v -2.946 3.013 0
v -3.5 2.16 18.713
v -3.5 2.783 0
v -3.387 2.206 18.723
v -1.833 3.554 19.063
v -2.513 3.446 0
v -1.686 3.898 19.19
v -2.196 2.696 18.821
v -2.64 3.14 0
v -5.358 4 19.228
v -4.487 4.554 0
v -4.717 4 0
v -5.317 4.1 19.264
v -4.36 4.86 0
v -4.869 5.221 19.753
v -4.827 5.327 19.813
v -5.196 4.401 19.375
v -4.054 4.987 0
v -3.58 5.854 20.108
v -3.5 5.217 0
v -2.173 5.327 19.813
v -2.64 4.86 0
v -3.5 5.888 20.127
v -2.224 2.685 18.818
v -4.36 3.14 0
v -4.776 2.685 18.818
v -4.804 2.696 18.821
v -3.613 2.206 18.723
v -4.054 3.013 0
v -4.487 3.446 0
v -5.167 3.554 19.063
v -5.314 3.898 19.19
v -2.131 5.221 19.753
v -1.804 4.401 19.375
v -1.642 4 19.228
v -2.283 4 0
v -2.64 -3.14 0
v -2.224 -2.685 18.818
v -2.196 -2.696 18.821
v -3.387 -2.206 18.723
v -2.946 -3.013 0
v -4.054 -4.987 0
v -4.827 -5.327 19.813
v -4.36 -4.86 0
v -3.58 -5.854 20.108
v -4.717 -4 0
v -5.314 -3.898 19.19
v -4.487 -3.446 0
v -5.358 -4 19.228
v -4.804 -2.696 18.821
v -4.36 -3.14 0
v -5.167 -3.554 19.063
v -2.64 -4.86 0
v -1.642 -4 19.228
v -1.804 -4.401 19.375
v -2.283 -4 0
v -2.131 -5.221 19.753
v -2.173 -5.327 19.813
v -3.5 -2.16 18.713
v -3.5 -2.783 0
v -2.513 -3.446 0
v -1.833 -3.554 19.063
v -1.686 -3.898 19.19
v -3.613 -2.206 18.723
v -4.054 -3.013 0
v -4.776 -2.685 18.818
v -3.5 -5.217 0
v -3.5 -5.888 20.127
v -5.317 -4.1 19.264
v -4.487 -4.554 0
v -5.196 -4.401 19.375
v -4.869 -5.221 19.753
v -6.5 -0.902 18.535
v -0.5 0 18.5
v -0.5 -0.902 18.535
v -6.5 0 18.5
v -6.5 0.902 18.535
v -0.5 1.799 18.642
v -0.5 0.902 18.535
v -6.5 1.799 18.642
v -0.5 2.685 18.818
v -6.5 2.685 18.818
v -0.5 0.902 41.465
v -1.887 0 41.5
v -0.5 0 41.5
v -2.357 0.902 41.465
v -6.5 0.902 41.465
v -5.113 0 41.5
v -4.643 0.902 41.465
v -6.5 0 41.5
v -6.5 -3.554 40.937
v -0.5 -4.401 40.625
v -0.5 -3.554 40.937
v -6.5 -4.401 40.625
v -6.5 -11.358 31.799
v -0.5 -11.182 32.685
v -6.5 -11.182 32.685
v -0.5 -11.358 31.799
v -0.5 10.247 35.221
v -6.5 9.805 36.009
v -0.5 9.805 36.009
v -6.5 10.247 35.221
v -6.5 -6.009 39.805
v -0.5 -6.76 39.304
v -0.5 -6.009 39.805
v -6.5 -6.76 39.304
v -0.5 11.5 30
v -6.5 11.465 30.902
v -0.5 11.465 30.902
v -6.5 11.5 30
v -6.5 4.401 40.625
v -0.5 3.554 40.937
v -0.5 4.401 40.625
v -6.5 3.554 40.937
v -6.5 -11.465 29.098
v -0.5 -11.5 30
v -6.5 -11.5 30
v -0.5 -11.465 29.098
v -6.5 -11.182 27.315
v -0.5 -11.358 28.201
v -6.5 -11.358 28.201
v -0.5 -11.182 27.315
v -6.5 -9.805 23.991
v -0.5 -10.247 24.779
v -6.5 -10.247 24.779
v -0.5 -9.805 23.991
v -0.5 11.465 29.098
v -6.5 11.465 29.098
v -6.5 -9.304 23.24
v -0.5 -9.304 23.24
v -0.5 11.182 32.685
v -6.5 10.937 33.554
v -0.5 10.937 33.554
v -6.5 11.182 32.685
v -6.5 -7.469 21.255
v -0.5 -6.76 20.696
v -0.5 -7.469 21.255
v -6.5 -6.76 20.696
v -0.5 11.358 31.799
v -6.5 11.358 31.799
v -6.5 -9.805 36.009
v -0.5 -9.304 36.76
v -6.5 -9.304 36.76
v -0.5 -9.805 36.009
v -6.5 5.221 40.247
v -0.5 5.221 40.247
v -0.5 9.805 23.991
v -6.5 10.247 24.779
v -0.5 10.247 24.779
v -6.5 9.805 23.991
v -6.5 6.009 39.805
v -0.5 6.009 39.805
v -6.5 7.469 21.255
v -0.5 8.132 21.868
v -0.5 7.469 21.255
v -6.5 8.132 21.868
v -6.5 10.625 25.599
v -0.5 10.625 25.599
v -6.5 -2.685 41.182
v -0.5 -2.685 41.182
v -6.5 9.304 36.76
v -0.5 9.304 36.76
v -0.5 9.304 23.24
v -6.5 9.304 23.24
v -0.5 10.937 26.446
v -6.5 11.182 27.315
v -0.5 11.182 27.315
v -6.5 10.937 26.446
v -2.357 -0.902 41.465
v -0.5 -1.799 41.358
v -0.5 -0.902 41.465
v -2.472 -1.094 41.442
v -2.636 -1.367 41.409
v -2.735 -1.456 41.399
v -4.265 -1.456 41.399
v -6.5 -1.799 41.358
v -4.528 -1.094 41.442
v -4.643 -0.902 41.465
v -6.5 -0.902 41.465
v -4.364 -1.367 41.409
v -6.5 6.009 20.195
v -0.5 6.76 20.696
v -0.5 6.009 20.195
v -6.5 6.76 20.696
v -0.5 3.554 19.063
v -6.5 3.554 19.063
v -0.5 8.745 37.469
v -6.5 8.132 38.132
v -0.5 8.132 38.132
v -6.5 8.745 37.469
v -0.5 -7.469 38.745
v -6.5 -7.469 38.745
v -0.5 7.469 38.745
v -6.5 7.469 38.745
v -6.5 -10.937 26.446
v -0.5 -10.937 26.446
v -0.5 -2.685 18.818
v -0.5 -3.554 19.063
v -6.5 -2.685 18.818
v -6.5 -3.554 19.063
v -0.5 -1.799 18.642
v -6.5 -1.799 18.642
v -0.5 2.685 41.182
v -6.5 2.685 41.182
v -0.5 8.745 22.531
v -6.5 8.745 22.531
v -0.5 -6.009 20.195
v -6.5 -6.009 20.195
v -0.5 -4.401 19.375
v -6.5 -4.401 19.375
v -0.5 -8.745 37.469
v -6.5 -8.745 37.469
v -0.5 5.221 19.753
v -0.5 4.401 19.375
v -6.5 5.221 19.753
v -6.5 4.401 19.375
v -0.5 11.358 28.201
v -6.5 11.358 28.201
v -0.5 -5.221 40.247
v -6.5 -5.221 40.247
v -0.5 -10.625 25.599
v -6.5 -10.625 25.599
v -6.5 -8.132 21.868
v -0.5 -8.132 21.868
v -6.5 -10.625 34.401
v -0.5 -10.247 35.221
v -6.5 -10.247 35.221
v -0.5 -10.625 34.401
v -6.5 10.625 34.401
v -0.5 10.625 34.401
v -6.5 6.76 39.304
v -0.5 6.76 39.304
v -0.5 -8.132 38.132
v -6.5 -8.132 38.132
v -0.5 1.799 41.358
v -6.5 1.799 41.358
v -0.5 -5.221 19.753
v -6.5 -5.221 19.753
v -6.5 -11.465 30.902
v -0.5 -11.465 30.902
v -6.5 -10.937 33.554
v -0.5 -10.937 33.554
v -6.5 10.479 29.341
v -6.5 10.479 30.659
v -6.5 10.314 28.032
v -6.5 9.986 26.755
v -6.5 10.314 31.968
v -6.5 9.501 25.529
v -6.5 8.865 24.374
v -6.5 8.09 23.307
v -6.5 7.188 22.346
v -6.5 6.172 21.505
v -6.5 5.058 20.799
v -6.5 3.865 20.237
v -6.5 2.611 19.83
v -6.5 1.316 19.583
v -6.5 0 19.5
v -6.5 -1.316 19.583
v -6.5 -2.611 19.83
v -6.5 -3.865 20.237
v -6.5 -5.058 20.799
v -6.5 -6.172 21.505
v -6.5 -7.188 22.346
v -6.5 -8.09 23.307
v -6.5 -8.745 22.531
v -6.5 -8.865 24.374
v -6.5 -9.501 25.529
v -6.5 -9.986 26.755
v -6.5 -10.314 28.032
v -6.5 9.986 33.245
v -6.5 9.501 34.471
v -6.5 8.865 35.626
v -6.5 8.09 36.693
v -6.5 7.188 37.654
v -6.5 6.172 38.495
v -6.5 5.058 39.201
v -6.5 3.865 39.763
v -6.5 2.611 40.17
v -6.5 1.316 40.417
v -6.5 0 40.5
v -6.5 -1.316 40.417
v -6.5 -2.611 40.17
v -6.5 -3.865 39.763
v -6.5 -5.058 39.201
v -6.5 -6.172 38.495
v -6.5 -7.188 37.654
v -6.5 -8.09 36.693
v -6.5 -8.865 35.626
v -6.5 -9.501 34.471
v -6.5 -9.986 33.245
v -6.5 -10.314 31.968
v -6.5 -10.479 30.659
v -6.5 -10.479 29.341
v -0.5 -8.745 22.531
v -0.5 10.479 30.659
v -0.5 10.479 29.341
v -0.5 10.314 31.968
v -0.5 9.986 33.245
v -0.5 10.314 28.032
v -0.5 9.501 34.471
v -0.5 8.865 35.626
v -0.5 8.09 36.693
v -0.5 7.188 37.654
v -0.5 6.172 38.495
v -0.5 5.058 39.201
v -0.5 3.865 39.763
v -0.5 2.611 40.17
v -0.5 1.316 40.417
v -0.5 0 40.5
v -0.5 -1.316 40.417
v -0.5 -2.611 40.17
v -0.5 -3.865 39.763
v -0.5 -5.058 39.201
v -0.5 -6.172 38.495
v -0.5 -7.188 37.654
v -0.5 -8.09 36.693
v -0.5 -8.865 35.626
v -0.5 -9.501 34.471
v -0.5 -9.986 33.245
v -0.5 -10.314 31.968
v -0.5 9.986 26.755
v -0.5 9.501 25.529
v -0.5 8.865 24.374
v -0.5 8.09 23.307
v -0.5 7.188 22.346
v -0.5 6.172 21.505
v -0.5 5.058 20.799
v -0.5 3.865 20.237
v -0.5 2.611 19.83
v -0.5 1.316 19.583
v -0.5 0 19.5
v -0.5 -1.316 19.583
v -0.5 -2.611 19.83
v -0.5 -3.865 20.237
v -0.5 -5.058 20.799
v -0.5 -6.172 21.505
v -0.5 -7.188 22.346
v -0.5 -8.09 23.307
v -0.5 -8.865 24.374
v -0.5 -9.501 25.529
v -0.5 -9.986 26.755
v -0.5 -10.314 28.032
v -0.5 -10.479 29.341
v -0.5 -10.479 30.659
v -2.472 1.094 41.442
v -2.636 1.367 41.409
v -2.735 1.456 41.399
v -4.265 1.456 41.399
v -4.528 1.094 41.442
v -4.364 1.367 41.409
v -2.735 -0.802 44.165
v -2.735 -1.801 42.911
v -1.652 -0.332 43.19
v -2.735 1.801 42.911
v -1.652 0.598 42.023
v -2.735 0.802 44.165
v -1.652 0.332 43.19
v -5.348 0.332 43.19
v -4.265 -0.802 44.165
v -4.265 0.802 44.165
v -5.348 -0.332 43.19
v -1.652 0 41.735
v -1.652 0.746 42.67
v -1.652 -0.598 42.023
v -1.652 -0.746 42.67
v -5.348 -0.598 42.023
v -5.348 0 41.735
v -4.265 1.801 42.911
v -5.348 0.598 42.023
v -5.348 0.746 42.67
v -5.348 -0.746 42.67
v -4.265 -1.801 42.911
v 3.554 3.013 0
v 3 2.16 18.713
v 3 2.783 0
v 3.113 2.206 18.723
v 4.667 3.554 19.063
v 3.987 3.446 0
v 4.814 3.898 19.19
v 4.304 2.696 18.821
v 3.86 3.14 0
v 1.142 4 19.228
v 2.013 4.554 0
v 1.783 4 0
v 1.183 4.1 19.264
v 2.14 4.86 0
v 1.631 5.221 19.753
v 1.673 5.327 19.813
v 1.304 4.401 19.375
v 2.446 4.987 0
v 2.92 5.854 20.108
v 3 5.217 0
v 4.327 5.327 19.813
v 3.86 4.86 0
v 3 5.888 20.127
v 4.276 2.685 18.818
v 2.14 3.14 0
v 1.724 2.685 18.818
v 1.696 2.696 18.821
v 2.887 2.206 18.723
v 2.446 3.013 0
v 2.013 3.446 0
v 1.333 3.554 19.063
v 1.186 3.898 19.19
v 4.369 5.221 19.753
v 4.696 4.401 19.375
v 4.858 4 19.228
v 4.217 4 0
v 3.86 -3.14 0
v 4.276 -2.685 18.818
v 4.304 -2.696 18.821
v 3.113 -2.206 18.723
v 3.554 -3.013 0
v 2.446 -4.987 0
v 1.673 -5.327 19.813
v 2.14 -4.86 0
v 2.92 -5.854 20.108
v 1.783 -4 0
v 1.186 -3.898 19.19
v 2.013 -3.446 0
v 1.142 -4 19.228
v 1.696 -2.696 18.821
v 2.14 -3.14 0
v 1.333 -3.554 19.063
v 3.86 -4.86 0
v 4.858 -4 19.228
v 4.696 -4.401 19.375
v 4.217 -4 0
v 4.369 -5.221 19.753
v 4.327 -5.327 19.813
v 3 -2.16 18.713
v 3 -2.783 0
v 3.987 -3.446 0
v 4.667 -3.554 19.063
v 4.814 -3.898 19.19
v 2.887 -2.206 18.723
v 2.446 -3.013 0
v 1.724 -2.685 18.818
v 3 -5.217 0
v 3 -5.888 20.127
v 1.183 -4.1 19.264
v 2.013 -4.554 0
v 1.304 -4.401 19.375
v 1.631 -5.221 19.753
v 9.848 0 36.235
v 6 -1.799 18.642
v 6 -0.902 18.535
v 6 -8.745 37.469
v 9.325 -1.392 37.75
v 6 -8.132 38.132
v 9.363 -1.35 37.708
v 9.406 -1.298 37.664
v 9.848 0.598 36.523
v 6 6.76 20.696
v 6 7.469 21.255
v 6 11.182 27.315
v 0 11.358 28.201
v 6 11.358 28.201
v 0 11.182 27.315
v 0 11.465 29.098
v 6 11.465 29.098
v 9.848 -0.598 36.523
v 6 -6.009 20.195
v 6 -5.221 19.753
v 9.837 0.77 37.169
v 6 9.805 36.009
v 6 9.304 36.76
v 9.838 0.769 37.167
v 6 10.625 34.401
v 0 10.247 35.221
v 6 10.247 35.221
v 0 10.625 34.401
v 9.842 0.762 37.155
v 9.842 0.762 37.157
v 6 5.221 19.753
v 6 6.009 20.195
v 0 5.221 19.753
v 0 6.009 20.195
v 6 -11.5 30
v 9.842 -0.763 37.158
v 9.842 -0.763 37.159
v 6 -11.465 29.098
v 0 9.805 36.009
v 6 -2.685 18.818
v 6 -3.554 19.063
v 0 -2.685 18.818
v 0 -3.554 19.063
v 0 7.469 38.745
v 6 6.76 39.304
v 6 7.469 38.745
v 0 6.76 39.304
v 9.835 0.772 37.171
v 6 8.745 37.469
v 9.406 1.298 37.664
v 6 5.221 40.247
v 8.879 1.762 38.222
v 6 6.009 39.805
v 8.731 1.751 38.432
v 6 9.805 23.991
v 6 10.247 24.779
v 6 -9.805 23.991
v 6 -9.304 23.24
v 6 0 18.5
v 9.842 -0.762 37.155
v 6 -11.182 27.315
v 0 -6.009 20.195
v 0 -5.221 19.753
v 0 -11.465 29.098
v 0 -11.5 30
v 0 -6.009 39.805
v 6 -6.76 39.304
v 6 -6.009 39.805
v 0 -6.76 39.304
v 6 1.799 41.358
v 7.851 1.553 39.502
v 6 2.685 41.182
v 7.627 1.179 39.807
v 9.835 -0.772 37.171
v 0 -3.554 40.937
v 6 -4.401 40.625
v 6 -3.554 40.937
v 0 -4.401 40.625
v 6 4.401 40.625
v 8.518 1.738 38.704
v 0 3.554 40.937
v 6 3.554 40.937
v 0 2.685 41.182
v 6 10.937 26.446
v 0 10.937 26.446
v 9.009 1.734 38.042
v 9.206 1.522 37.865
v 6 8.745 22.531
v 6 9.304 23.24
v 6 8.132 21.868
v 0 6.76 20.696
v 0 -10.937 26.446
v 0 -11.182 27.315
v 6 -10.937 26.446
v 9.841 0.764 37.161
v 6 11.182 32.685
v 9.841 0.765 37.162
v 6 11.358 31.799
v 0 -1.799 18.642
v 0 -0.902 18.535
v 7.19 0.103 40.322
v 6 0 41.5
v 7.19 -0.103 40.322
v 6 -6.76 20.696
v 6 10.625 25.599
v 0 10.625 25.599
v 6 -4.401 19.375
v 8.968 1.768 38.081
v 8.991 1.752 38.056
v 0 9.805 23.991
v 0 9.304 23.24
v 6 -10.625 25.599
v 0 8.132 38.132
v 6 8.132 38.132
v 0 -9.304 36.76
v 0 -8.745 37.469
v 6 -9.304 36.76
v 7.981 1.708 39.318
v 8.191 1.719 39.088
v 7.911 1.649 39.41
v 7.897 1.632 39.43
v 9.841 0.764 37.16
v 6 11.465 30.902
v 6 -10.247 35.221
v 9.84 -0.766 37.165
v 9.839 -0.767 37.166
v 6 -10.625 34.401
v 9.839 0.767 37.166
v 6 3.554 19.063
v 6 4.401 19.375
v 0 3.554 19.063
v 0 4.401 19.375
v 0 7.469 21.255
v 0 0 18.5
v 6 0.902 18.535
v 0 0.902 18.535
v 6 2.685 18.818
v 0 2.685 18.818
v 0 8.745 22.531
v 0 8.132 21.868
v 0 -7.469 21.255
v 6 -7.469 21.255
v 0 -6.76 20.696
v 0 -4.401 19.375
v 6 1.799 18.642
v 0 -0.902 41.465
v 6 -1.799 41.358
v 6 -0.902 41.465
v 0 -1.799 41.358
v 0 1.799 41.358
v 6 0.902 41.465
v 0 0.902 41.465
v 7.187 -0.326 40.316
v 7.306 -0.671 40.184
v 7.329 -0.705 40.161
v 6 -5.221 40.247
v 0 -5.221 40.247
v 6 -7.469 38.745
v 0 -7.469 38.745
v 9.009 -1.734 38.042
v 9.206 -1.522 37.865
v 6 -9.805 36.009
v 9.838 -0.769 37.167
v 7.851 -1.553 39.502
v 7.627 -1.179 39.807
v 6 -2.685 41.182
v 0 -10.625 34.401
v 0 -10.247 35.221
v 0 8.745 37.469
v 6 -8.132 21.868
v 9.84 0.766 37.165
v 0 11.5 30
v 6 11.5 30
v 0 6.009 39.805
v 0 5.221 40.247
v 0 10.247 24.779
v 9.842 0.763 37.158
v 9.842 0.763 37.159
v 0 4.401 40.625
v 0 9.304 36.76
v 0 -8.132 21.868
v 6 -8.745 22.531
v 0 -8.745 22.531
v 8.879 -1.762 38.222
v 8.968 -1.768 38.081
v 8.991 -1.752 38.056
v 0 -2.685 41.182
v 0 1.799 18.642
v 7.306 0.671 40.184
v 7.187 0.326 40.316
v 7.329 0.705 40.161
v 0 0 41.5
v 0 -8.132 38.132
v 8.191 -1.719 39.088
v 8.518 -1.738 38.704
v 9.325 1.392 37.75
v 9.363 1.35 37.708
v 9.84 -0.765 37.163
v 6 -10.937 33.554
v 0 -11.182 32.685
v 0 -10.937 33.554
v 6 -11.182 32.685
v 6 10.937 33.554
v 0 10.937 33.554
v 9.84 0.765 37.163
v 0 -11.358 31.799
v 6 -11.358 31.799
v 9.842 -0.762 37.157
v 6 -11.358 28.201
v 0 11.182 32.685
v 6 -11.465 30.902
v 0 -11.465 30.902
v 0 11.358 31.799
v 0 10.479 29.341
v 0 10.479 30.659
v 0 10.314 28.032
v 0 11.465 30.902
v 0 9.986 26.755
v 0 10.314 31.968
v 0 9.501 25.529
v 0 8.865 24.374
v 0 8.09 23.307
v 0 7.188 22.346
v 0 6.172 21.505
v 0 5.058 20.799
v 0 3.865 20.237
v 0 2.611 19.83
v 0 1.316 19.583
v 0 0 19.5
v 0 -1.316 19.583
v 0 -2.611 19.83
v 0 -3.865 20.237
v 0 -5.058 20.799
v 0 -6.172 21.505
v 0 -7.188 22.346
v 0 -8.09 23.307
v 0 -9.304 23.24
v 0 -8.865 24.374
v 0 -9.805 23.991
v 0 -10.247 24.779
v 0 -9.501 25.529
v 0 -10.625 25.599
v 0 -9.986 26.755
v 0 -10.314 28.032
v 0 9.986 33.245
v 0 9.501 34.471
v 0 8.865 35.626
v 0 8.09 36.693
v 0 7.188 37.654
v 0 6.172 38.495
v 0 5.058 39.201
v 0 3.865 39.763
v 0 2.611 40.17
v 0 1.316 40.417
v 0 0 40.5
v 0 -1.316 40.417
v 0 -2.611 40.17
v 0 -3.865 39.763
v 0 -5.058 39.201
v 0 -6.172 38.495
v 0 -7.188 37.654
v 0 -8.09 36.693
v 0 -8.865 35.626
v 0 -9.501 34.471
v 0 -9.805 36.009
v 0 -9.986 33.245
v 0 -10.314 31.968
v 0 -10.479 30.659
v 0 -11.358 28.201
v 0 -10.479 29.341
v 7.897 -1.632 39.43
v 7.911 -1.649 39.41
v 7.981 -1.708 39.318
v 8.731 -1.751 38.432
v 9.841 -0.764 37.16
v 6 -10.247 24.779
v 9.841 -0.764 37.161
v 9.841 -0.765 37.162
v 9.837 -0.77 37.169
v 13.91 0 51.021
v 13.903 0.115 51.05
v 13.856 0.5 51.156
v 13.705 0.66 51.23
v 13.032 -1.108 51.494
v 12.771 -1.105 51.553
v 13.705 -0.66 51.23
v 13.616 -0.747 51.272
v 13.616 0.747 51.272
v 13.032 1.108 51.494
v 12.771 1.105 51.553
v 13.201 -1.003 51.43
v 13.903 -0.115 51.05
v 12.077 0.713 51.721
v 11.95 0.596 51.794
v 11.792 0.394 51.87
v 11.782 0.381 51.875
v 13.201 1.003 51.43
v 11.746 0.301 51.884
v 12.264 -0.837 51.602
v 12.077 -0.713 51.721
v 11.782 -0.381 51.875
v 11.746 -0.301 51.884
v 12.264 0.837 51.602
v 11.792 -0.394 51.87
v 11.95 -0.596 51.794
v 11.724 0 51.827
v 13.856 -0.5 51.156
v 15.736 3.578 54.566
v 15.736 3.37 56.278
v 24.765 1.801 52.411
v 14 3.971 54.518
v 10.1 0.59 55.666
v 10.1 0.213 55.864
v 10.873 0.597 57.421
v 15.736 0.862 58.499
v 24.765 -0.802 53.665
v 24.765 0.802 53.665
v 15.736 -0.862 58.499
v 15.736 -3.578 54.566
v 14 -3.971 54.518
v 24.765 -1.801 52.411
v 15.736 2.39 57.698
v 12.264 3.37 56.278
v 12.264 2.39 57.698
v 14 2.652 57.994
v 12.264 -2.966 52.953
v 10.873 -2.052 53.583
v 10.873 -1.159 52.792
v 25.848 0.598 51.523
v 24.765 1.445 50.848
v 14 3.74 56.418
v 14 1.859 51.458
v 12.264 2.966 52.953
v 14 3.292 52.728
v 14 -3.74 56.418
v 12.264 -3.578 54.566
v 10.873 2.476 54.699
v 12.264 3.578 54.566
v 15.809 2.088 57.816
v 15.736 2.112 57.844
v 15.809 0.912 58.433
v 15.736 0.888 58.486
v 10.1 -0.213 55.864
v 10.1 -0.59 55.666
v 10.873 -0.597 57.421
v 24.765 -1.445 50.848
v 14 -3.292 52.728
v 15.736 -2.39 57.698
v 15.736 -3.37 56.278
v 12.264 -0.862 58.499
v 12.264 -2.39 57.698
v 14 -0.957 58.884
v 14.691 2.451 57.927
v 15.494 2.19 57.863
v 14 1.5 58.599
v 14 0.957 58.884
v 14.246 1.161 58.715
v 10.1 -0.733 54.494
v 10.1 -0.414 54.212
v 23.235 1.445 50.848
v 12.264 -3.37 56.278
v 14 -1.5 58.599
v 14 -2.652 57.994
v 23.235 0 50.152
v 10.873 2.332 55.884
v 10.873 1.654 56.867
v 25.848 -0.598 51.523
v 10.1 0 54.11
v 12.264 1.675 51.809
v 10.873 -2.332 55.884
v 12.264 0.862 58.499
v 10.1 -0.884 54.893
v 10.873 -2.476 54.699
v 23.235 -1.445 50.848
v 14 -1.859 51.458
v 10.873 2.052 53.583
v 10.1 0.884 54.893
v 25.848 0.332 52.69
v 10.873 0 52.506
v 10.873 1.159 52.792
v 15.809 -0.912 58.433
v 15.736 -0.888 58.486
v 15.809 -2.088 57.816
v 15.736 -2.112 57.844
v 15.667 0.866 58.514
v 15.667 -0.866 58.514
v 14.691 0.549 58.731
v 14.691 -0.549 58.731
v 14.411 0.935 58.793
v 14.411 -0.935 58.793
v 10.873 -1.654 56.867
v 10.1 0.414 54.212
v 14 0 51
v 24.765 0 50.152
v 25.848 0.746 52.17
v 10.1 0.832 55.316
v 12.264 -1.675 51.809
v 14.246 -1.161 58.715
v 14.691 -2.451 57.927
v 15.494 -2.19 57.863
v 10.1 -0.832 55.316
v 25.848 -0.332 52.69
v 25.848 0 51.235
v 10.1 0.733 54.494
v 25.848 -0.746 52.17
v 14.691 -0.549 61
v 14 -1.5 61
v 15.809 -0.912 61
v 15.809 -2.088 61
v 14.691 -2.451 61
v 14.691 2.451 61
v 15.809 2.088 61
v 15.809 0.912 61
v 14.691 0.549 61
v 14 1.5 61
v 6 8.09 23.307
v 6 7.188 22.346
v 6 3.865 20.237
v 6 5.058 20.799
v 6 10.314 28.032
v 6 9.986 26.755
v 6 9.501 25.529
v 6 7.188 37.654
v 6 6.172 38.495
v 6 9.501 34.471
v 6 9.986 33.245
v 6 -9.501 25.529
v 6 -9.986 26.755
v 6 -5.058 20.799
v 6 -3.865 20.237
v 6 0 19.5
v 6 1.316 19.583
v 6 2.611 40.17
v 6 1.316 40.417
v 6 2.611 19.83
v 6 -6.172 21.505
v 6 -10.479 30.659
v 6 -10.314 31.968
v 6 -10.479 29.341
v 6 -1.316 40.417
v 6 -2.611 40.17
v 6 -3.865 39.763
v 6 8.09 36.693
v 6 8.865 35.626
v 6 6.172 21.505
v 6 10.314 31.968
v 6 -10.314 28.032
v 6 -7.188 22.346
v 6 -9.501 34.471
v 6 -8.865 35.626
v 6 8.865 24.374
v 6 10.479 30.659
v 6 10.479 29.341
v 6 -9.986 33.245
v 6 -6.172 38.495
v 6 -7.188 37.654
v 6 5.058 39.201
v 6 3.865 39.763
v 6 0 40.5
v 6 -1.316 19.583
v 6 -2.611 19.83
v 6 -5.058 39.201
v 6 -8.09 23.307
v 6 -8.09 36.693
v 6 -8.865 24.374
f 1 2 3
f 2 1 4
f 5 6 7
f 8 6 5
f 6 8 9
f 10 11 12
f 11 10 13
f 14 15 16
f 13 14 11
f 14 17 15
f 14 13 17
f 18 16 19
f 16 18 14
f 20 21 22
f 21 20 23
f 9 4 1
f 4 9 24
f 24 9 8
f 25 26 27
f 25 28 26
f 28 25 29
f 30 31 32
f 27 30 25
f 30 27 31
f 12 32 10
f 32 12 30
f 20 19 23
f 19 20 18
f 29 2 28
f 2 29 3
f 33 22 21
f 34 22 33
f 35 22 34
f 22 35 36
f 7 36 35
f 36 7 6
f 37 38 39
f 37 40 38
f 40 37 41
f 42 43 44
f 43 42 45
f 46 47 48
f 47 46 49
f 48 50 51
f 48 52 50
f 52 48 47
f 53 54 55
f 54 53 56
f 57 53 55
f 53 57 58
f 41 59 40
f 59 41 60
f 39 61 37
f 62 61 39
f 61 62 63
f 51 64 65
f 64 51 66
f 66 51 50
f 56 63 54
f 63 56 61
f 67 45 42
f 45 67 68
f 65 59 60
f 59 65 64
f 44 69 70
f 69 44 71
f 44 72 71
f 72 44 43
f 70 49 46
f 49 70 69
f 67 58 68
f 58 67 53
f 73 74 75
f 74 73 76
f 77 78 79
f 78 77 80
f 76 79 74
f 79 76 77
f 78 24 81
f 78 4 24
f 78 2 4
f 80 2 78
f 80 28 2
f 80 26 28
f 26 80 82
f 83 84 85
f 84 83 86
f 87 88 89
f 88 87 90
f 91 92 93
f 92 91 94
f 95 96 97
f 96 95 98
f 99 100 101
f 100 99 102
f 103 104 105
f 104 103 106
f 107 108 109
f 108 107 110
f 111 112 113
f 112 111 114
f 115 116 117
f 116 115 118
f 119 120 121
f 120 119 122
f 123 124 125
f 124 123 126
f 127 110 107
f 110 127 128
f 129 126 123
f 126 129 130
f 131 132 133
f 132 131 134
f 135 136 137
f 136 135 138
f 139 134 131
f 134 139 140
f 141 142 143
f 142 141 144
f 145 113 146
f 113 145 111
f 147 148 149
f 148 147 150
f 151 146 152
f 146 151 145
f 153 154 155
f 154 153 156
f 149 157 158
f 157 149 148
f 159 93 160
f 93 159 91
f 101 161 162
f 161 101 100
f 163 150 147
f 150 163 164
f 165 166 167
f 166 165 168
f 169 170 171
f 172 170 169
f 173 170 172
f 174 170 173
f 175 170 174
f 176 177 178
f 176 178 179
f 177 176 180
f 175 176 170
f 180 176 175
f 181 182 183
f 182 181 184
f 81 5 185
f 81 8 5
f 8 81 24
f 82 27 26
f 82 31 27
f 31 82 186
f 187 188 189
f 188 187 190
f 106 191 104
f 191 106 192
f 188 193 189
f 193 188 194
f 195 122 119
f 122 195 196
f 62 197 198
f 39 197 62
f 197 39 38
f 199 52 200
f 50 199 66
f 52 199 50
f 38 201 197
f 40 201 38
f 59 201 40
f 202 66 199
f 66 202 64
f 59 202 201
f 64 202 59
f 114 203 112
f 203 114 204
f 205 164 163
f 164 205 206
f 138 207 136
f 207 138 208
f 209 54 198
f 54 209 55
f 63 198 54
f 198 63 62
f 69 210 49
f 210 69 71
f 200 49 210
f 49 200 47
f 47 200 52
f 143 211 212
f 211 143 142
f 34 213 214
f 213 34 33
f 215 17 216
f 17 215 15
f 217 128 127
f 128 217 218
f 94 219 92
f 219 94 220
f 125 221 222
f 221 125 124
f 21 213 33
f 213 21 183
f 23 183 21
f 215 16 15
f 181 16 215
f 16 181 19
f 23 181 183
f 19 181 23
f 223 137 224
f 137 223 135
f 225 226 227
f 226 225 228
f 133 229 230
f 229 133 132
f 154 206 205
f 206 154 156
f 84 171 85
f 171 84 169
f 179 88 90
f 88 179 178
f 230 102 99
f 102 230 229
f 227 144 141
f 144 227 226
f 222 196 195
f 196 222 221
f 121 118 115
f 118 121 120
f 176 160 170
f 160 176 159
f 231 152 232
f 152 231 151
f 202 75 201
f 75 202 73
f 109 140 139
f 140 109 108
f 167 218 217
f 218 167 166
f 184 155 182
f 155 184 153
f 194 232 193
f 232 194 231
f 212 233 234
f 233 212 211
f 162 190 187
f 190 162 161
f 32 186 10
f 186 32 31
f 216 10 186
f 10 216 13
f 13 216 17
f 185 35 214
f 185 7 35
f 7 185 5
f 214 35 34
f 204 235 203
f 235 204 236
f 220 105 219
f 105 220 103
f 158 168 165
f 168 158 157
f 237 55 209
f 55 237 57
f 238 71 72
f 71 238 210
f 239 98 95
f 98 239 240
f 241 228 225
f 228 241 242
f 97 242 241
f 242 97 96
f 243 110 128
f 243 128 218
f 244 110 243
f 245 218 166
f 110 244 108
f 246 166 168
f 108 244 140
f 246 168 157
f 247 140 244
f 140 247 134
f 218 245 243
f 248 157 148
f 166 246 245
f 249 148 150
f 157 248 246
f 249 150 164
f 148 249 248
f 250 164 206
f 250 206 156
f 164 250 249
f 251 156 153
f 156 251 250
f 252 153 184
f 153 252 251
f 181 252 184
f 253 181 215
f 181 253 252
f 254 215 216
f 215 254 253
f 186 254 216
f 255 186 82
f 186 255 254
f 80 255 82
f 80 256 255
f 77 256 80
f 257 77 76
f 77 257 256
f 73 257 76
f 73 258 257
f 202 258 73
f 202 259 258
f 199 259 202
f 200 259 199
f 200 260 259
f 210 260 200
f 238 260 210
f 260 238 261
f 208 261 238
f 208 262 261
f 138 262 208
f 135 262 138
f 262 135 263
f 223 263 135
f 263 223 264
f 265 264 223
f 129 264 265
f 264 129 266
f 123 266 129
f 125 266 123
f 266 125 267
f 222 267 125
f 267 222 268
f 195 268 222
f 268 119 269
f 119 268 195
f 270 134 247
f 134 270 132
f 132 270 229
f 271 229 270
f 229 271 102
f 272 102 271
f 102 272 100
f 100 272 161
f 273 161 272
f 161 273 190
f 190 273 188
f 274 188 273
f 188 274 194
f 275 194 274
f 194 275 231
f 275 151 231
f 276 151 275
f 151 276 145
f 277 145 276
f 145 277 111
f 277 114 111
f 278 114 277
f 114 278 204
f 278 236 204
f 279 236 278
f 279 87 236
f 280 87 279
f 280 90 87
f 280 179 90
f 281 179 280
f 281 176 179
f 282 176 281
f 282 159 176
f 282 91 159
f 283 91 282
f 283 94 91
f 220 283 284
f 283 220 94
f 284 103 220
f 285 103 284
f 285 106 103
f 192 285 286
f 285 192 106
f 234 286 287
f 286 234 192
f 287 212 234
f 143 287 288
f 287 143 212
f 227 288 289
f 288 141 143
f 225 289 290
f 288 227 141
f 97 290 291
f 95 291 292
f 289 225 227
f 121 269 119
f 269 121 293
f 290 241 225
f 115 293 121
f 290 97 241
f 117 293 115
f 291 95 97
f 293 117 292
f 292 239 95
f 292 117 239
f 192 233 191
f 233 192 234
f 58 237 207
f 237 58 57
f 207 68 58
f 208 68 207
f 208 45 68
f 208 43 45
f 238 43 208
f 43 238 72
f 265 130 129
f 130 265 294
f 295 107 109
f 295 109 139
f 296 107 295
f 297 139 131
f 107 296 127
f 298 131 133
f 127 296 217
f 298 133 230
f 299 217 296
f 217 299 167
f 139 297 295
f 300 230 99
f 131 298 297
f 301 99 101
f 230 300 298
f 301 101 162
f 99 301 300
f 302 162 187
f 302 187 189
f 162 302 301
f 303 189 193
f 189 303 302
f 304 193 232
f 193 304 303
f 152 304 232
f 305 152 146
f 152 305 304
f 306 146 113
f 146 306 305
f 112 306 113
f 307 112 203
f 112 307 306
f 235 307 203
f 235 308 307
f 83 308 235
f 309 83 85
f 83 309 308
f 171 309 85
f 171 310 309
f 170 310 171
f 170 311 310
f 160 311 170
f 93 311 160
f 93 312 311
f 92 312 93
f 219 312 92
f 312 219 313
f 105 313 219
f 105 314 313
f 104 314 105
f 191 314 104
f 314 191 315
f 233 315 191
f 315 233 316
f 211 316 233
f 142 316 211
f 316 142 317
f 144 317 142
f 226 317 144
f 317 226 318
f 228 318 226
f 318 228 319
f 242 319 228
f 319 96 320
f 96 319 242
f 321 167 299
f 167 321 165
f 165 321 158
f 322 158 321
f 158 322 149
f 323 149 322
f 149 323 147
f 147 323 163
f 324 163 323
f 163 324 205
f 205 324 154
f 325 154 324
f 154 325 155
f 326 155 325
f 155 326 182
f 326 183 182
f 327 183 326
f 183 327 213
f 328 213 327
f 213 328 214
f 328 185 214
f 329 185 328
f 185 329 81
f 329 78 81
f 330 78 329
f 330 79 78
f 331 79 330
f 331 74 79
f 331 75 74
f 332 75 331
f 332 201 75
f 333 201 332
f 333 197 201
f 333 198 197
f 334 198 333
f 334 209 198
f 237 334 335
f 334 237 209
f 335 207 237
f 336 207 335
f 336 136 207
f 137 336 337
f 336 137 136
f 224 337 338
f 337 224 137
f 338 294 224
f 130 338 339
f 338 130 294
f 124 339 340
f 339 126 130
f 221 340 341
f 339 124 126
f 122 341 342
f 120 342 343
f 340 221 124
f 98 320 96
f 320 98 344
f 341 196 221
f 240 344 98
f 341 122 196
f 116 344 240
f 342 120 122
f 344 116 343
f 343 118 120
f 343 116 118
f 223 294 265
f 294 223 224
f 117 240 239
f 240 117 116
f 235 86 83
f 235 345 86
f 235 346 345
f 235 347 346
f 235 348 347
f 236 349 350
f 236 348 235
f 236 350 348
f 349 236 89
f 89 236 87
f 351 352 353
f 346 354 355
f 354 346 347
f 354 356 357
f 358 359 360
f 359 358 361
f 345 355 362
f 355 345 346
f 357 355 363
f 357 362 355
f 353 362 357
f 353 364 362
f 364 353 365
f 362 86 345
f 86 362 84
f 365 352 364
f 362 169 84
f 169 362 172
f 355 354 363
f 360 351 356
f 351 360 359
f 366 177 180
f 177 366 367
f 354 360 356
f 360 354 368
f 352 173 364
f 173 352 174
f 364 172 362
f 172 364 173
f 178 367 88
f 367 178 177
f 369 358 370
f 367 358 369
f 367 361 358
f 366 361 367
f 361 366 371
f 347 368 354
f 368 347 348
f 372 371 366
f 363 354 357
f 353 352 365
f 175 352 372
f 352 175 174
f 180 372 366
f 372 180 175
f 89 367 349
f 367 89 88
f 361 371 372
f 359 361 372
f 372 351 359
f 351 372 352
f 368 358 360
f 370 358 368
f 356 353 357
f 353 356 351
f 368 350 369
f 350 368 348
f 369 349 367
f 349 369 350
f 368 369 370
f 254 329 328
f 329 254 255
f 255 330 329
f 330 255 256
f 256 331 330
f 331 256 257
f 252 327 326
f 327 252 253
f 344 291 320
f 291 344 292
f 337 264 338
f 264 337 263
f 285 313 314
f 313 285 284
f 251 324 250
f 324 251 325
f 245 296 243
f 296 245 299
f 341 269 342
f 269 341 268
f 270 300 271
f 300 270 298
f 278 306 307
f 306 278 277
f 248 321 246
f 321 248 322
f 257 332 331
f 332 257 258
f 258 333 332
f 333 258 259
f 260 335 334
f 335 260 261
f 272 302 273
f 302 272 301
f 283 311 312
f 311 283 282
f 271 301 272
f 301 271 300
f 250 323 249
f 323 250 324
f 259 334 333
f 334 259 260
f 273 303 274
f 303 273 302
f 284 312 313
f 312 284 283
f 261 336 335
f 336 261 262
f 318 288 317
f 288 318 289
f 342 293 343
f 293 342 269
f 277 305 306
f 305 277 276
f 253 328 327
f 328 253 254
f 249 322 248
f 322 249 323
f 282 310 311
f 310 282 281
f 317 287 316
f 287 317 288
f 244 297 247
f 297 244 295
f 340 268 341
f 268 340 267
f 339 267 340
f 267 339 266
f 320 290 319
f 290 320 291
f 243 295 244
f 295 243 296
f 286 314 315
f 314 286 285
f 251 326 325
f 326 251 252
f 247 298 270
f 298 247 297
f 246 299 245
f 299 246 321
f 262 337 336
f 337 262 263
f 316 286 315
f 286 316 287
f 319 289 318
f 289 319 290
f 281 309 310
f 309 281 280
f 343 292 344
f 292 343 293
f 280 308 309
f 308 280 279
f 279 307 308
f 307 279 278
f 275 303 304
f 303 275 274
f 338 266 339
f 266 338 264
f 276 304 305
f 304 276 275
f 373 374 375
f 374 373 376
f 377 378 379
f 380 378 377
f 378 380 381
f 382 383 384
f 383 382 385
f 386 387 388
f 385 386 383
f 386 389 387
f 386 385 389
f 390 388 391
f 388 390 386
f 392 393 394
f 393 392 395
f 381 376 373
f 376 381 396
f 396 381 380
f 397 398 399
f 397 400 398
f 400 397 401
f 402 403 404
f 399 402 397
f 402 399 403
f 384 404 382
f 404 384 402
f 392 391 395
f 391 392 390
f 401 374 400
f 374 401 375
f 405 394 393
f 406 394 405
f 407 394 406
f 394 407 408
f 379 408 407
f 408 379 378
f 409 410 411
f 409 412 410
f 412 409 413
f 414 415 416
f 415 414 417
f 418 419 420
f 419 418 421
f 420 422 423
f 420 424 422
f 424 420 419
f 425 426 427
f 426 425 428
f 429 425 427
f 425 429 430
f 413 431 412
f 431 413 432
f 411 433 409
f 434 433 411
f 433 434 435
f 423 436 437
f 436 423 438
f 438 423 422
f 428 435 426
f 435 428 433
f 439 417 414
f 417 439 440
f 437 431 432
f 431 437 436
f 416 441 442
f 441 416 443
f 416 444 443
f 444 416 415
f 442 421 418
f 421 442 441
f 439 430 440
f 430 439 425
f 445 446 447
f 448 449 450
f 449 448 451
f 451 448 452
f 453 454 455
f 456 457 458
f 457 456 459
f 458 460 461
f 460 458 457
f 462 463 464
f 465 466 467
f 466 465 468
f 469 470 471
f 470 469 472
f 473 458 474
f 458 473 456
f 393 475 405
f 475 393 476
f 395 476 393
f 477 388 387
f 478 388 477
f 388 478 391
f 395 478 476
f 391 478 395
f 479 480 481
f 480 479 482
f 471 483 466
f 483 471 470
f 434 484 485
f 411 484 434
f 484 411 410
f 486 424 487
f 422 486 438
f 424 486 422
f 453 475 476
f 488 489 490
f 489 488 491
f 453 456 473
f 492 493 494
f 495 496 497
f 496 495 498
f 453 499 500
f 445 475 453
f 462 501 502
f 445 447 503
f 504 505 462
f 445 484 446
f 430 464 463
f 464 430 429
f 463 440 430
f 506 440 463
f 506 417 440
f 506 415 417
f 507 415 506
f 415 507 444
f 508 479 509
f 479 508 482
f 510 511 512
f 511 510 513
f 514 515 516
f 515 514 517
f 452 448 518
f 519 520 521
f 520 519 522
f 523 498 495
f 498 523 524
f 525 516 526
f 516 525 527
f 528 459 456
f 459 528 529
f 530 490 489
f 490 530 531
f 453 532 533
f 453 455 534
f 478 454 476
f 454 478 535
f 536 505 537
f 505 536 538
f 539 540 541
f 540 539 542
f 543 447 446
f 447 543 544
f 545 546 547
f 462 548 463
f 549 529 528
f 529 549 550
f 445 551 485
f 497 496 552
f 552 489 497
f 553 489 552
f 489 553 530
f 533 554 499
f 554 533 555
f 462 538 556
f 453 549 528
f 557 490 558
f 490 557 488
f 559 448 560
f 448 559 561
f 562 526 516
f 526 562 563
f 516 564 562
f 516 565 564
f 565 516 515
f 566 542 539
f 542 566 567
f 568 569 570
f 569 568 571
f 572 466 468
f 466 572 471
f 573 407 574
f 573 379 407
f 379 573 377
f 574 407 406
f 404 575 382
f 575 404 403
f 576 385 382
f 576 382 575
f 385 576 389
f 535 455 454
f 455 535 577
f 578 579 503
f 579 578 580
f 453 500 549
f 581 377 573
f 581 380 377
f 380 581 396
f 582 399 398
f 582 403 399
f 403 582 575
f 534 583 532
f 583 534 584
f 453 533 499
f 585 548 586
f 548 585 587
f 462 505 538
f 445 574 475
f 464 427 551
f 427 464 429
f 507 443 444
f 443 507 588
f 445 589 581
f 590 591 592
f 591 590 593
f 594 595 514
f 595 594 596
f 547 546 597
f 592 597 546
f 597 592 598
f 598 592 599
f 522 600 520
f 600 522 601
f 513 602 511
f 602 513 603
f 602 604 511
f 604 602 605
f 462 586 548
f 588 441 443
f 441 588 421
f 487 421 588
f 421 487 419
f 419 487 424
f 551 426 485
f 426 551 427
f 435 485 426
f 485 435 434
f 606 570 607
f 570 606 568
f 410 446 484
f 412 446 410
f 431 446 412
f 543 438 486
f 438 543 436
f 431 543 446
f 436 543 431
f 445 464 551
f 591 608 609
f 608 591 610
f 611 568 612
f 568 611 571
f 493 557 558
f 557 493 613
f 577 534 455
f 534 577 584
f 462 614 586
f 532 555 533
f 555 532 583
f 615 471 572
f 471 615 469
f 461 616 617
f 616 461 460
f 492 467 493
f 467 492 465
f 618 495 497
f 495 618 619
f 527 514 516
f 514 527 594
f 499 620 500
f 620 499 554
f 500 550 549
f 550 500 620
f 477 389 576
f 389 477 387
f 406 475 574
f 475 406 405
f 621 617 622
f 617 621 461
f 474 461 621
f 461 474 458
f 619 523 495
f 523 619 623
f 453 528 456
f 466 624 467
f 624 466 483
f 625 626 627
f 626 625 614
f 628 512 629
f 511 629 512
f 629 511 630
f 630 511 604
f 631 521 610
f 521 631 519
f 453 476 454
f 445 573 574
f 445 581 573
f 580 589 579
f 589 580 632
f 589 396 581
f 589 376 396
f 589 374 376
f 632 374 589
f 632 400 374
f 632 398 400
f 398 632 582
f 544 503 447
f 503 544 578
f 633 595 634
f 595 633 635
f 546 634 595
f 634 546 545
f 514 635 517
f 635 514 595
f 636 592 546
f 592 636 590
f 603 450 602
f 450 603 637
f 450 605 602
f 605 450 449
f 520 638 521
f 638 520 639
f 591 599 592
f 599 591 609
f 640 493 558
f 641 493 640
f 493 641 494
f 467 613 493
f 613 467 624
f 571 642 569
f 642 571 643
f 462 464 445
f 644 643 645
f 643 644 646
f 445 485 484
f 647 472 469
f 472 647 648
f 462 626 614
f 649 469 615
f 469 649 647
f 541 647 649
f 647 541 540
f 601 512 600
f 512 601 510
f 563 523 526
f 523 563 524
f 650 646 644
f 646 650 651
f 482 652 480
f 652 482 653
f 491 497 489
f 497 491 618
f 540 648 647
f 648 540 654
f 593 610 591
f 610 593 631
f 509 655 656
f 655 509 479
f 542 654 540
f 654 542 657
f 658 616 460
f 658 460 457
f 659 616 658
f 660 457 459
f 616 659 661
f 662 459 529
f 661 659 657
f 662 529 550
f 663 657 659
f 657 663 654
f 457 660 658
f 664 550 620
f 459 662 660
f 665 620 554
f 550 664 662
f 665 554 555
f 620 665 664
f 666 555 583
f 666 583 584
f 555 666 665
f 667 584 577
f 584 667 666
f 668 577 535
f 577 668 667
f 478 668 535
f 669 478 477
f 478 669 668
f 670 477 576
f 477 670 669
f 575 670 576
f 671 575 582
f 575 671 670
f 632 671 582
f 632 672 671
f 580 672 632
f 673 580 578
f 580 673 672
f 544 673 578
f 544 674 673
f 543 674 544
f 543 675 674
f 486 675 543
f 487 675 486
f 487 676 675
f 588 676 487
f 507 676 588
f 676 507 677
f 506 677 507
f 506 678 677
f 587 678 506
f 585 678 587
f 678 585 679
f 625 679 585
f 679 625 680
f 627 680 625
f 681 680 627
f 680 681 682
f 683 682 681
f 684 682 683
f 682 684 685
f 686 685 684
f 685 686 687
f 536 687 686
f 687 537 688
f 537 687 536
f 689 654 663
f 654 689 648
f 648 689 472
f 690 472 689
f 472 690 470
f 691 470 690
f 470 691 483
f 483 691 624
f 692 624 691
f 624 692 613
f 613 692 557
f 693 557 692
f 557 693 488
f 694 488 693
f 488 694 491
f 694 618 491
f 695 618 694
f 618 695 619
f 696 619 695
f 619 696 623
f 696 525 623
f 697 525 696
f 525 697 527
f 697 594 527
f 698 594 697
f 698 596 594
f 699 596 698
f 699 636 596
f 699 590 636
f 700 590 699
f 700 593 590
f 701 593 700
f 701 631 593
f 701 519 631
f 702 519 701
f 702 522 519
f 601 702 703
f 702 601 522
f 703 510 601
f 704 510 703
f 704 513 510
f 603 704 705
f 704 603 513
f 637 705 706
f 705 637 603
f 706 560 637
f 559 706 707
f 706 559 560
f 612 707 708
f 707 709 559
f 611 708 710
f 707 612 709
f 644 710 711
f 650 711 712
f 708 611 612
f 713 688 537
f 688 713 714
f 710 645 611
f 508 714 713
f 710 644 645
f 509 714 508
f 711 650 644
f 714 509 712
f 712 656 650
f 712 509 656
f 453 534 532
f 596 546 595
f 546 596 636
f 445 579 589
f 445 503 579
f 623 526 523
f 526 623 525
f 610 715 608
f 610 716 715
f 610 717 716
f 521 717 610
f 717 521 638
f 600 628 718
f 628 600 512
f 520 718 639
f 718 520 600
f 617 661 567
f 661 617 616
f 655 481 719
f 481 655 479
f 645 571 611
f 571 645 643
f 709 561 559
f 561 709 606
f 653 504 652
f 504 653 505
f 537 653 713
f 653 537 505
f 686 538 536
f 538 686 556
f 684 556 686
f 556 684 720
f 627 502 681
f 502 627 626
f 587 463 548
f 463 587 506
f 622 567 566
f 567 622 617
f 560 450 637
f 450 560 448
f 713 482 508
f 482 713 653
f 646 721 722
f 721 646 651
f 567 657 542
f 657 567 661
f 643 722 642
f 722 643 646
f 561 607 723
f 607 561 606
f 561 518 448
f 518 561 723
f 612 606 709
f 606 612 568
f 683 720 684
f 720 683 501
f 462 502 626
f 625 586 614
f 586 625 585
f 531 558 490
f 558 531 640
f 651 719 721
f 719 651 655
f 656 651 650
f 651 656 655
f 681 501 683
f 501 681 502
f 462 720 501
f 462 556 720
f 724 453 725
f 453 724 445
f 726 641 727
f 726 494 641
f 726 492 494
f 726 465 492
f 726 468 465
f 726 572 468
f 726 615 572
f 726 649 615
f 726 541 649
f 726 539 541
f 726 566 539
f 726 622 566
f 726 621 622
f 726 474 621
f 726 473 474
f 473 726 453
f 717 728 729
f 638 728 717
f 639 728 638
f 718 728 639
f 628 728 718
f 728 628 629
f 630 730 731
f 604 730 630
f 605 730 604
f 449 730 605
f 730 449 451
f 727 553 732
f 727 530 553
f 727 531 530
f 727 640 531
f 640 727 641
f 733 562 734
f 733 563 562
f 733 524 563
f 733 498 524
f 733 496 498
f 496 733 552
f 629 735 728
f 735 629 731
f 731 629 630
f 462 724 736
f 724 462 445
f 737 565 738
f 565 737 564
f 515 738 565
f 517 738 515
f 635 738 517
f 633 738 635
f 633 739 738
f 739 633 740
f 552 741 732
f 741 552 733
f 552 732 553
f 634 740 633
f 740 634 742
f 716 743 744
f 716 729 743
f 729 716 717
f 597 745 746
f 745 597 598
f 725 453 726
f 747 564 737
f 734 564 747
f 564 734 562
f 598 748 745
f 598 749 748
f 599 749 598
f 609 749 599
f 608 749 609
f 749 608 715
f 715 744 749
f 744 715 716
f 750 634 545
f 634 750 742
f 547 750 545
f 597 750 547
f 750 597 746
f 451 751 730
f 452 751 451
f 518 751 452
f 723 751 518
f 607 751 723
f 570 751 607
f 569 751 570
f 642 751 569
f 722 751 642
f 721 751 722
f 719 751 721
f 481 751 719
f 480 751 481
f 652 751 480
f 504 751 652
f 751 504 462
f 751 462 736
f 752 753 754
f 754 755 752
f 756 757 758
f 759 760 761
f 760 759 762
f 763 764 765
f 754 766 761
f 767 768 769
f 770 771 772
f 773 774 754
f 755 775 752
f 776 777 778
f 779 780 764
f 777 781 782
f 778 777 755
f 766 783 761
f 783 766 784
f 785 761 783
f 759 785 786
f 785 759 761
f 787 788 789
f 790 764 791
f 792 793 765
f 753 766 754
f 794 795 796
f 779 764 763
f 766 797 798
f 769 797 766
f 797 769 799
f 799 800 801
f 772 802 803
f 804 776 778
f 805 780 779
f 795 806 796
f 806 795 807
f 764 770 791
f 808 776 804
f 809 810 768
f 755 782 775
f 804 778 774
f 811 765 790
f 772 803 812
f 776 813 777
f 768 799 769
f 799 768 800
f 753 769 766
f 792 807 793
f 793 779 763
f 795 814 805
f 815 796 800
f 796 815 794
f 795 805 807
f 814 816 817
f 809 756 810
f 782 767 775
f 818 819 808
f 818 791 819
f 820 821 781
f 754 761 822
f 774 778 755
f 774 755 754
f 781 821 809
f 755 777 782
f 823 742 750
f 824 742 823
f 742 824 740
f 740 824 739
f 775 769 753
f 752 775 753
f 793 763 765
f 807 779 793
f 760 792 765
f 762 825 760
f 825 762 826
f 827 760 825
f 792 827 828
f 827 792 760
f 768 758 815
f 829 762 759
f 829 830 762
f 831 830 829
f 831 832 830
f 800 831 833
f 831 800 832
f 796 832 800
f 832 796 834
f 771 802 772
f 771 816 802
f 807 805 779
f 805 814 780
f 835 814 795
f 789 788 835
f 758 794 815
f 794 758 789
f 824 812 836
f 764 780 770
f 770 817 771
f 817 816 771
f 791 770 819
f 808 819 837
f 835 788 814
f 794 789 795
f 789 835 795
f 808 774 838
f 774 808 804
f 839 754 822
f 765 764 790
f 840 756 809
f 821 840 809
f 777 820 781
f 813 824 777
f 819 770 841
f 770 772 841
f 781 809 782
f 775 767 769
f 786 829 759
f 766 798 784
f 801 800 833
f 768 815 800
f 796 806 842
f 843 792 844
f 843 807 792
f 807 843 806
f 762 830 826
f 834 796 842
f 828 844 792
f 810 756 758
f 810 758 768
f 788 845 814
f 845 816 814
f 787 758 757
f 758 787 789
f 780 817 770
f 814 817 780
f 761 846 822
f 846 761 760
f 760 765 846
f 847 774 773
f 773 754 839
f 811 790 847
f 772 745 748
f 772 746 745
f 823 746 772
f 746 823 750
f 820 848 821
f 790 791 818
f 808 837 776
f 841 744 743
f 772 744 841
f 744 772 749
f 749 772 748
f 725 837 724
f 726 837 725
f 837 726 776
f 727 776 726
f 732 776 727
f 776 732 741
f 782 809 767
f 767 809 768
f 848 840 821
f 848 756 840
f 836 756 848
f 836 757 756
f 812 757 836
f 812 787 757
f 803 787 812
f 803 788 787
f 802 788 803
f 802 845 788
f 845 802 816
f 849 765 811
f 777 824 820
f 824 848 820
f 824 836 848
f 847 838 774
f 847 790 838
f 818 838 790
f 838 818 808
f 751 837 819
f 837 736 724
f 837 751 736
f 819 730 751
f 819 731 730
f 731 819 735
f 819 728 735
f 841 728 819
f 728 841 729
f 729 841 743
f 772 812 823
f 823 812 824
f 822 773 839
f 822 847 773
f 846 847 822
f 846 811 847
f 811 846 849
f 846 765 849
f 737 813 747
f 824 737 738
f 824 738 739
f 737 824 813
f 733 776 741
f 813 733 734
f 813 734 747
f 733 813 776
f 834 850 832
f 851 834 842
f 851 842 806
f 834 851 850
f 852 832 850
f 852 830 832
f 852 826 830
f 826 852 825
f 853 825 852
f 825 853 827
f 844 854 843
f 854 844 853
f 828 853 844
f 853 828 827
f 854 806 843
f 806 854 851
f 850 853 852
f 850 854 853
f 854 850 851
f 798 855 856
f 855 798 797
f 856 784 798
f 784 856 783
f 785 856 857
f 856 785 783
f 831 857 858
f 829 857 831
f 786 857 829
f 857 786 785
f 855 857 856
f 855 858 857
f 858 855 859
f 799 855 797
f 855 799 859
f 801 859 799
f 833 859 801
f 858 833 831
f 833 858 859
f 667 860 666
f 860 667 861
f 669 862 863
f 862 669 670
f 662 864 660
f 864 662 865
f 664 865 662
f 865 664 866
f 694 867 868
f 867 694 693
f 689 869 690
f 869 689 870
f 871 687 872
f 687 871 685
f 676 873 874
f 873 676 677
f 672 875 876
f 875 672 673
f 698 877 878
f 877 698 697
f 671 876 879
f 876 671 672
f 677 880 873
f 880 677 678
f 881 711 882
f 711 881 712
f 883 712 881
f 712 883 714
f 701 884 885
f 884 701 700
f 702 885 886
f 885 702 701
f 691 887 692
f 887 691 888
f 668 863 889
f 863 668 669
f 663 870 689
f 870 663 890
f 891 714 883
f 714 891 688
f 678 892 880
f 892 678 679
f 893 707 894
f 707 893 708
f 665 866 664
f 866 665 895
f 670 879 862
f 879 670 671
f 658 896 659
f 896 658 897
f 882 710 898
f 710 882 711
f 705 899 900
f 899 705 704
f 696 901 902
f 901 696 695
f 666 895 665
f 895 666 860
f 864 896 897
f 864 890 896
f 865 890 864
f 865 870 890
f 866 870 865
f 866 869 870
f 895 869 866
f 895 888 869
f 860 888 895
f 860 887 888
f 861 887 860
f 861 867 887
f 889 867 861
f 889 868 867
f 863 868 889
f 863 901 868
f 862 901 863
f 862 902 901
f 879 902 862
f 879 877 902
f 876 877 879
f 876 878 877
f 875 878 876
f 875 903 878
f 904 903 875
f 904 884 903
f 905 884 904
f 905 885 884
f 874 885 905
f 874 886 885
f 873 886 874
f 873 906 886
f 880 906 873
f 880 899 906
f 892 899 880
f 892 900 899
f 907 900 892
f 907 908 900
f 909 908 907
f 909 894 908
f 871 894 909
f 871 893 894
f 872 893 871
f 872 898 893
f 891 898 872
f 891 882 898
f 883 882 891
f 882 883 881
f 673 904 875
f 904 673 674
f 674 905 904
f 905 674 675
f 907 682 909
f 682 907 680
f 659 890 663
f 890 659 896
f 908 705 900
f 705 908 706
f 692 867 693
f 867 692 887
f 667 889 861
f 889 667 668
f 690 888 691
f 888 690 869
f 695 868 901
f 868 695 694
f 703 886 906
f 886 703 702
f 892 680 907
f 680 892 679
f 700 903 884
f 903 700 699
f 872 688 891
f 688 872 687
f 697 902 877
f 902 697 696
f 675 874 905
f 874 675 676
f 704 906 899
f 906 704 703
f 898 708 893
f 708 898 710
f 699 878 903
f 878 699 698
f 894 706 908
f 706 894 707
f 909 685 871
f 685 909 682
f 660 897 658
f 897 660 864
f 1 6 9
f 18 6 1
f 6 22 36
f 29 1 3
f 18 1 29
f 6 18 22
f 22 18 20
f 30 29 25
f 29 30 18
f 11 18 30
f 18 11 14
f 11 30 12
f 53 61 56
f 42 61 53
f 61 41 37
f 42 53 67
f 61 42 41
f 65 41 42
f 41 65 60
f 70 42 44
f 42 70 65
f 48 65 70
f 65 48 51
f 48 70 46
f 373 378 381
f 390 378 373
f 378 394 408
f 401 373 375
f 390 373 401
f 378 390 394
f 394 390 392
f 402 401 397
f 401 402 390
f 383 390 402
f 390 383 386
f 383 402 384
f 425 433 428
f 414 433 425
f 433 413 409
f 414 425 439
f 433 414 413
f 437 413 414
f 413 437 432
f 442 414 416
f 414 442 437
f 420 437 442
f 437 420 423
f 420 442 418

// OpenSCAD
/**
  Cork Pal - Customizable Lama

  by Phil Schatzmann 
  
**/

 
corkDiameterFront=21;
corkDiameterBack=21;
legHeight=19;
neck=25;
cylinderHeight=6;



module body(corkDiameter) {
     cylinder(h=cylinderHeight, d=corkDiameter+2, center=false,$fn=80);
}

module bodyHole(corkDiameter) {
    cylinder(h=cylinderHeight+5, d=corkDiameter,$fn=50);
}
 
module legs(corkRadius) {
    translate([corkRadius/2-4,4,3]) rotate([0,90,0]) 
        cylinder(legHeight+11,2,1,$fn=8);
    translate([corkRadius/2-4,-4,3]) rotate([0,90,0]) 
        cylinder(legHeight+11,2,1,$fn=8); 
}
 
module back() {
    difference() {
        union() {
            body(corkDiameterBack);
            legs(corkDiameterBack);
            translate([-(corkDiameterBack/2+2),0,3]) 
                sphere(r=2);
        }
        translate([0,0,-5]) bodyHole(corkDiameterBack);
    }
}
 

module frontSolid() {
    union() {
        hull() {
            body(corkDiameterFront);
            translate([-7,0,8]) 
                sphere(2);
        }
        hull() {
            translate([-7,0,8]) 
                sphere(2);
        
            translate([-neck,0,14]) 
                sphere(1);                 
        }  
        hull() {
            translate([-neck,0,14]) 
                sphere(4);  
            translate([-neck+3,0,24]) 
                sphere(2);    
        }
        translate([-neck-4,-1.5,15]) rotate([0,90,0]) 
             cylinder(h=4, d1=2, d2=2, center=true);
        translate([-neck-4,1.5,15]) rotate([0,90,0]) 
             cylinder(h=4, d1=2, d2=2, center=true);

        
        translate([0,0,cylinderHeight-6]) 
            legs(corkDiameterFront);
        }
}

module front() {
     difference() {
        frontSolid();
        translate([0,0,-5])  
           bodyHole(corkDiameterFront);

    }
}

module printAll() {
    difference() {
        union() {
            if (corkDiameterBack>0){
                translate([-cylinderHeight-0.5, 0,legHeight+11]) rotate([0,90,0])  
                    back();
            }
            if (corkDiameterFront>0){
                translate([0,0,legHeight+11]) rotate([0,90,0]) 
                    front();
            }
        }
        // make feet levelled
        translate([-500,-500,-100]) cube(size=[1000,1000,100]);
    }
}



printAll();
